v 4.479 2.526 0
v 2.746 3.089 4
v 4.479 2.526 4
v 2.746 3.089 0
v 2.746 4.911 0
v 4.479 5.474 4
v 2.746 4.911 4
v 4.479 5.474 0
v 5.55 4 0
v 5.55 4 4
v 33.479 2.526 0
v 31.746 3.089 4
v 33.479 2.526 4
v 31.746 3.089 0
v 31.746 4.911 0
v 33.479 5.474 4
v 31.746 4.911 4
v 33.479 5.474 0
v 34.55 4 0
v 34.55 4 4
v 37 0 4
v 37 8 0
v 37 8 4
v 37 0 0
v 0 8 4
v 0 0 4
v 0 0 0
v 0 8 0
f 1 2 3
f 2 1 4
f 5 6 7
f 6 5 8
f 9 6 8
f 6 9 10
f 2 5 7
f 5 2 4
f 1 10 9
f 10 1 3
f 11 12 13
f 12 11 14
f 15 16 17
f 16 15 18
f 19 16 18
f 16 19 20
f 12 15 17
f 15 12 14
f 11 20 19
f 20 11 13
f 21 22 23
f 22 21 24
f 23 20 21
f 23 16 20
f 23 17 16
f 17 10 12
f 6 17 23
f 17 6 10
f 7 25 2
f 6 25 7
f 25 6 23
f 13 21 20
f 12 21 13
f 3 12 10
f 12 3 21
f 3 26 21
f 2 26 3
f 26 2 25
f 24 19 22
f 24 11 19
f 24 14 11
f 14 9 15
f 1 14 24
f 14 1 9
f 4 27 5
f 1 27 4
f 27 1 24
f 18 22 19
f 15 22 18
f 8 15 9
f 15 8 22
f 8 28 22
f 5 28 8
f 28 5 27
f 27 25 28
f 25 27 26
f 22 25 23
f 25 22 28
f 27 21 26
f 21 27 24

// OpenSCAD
module clamp(distance_holes, x_end, y_end, depth, d_screw){
difference (){
cube([distance_holes+x_end*2,y_end*2,depth], center=false);

union (){
    translate ([x_end,y_end,-0.1]) cylinder (d=d_screw, h=depth+0.2);
    translate ([distance_holes+x_end,y_end,-0.1]) cylinder (d=d_screw, h=depth+0.2);
    }
}
}

clamp (distance_holes=29, x_end=4, y_end=4, depth=4, d_screw=3.1);
